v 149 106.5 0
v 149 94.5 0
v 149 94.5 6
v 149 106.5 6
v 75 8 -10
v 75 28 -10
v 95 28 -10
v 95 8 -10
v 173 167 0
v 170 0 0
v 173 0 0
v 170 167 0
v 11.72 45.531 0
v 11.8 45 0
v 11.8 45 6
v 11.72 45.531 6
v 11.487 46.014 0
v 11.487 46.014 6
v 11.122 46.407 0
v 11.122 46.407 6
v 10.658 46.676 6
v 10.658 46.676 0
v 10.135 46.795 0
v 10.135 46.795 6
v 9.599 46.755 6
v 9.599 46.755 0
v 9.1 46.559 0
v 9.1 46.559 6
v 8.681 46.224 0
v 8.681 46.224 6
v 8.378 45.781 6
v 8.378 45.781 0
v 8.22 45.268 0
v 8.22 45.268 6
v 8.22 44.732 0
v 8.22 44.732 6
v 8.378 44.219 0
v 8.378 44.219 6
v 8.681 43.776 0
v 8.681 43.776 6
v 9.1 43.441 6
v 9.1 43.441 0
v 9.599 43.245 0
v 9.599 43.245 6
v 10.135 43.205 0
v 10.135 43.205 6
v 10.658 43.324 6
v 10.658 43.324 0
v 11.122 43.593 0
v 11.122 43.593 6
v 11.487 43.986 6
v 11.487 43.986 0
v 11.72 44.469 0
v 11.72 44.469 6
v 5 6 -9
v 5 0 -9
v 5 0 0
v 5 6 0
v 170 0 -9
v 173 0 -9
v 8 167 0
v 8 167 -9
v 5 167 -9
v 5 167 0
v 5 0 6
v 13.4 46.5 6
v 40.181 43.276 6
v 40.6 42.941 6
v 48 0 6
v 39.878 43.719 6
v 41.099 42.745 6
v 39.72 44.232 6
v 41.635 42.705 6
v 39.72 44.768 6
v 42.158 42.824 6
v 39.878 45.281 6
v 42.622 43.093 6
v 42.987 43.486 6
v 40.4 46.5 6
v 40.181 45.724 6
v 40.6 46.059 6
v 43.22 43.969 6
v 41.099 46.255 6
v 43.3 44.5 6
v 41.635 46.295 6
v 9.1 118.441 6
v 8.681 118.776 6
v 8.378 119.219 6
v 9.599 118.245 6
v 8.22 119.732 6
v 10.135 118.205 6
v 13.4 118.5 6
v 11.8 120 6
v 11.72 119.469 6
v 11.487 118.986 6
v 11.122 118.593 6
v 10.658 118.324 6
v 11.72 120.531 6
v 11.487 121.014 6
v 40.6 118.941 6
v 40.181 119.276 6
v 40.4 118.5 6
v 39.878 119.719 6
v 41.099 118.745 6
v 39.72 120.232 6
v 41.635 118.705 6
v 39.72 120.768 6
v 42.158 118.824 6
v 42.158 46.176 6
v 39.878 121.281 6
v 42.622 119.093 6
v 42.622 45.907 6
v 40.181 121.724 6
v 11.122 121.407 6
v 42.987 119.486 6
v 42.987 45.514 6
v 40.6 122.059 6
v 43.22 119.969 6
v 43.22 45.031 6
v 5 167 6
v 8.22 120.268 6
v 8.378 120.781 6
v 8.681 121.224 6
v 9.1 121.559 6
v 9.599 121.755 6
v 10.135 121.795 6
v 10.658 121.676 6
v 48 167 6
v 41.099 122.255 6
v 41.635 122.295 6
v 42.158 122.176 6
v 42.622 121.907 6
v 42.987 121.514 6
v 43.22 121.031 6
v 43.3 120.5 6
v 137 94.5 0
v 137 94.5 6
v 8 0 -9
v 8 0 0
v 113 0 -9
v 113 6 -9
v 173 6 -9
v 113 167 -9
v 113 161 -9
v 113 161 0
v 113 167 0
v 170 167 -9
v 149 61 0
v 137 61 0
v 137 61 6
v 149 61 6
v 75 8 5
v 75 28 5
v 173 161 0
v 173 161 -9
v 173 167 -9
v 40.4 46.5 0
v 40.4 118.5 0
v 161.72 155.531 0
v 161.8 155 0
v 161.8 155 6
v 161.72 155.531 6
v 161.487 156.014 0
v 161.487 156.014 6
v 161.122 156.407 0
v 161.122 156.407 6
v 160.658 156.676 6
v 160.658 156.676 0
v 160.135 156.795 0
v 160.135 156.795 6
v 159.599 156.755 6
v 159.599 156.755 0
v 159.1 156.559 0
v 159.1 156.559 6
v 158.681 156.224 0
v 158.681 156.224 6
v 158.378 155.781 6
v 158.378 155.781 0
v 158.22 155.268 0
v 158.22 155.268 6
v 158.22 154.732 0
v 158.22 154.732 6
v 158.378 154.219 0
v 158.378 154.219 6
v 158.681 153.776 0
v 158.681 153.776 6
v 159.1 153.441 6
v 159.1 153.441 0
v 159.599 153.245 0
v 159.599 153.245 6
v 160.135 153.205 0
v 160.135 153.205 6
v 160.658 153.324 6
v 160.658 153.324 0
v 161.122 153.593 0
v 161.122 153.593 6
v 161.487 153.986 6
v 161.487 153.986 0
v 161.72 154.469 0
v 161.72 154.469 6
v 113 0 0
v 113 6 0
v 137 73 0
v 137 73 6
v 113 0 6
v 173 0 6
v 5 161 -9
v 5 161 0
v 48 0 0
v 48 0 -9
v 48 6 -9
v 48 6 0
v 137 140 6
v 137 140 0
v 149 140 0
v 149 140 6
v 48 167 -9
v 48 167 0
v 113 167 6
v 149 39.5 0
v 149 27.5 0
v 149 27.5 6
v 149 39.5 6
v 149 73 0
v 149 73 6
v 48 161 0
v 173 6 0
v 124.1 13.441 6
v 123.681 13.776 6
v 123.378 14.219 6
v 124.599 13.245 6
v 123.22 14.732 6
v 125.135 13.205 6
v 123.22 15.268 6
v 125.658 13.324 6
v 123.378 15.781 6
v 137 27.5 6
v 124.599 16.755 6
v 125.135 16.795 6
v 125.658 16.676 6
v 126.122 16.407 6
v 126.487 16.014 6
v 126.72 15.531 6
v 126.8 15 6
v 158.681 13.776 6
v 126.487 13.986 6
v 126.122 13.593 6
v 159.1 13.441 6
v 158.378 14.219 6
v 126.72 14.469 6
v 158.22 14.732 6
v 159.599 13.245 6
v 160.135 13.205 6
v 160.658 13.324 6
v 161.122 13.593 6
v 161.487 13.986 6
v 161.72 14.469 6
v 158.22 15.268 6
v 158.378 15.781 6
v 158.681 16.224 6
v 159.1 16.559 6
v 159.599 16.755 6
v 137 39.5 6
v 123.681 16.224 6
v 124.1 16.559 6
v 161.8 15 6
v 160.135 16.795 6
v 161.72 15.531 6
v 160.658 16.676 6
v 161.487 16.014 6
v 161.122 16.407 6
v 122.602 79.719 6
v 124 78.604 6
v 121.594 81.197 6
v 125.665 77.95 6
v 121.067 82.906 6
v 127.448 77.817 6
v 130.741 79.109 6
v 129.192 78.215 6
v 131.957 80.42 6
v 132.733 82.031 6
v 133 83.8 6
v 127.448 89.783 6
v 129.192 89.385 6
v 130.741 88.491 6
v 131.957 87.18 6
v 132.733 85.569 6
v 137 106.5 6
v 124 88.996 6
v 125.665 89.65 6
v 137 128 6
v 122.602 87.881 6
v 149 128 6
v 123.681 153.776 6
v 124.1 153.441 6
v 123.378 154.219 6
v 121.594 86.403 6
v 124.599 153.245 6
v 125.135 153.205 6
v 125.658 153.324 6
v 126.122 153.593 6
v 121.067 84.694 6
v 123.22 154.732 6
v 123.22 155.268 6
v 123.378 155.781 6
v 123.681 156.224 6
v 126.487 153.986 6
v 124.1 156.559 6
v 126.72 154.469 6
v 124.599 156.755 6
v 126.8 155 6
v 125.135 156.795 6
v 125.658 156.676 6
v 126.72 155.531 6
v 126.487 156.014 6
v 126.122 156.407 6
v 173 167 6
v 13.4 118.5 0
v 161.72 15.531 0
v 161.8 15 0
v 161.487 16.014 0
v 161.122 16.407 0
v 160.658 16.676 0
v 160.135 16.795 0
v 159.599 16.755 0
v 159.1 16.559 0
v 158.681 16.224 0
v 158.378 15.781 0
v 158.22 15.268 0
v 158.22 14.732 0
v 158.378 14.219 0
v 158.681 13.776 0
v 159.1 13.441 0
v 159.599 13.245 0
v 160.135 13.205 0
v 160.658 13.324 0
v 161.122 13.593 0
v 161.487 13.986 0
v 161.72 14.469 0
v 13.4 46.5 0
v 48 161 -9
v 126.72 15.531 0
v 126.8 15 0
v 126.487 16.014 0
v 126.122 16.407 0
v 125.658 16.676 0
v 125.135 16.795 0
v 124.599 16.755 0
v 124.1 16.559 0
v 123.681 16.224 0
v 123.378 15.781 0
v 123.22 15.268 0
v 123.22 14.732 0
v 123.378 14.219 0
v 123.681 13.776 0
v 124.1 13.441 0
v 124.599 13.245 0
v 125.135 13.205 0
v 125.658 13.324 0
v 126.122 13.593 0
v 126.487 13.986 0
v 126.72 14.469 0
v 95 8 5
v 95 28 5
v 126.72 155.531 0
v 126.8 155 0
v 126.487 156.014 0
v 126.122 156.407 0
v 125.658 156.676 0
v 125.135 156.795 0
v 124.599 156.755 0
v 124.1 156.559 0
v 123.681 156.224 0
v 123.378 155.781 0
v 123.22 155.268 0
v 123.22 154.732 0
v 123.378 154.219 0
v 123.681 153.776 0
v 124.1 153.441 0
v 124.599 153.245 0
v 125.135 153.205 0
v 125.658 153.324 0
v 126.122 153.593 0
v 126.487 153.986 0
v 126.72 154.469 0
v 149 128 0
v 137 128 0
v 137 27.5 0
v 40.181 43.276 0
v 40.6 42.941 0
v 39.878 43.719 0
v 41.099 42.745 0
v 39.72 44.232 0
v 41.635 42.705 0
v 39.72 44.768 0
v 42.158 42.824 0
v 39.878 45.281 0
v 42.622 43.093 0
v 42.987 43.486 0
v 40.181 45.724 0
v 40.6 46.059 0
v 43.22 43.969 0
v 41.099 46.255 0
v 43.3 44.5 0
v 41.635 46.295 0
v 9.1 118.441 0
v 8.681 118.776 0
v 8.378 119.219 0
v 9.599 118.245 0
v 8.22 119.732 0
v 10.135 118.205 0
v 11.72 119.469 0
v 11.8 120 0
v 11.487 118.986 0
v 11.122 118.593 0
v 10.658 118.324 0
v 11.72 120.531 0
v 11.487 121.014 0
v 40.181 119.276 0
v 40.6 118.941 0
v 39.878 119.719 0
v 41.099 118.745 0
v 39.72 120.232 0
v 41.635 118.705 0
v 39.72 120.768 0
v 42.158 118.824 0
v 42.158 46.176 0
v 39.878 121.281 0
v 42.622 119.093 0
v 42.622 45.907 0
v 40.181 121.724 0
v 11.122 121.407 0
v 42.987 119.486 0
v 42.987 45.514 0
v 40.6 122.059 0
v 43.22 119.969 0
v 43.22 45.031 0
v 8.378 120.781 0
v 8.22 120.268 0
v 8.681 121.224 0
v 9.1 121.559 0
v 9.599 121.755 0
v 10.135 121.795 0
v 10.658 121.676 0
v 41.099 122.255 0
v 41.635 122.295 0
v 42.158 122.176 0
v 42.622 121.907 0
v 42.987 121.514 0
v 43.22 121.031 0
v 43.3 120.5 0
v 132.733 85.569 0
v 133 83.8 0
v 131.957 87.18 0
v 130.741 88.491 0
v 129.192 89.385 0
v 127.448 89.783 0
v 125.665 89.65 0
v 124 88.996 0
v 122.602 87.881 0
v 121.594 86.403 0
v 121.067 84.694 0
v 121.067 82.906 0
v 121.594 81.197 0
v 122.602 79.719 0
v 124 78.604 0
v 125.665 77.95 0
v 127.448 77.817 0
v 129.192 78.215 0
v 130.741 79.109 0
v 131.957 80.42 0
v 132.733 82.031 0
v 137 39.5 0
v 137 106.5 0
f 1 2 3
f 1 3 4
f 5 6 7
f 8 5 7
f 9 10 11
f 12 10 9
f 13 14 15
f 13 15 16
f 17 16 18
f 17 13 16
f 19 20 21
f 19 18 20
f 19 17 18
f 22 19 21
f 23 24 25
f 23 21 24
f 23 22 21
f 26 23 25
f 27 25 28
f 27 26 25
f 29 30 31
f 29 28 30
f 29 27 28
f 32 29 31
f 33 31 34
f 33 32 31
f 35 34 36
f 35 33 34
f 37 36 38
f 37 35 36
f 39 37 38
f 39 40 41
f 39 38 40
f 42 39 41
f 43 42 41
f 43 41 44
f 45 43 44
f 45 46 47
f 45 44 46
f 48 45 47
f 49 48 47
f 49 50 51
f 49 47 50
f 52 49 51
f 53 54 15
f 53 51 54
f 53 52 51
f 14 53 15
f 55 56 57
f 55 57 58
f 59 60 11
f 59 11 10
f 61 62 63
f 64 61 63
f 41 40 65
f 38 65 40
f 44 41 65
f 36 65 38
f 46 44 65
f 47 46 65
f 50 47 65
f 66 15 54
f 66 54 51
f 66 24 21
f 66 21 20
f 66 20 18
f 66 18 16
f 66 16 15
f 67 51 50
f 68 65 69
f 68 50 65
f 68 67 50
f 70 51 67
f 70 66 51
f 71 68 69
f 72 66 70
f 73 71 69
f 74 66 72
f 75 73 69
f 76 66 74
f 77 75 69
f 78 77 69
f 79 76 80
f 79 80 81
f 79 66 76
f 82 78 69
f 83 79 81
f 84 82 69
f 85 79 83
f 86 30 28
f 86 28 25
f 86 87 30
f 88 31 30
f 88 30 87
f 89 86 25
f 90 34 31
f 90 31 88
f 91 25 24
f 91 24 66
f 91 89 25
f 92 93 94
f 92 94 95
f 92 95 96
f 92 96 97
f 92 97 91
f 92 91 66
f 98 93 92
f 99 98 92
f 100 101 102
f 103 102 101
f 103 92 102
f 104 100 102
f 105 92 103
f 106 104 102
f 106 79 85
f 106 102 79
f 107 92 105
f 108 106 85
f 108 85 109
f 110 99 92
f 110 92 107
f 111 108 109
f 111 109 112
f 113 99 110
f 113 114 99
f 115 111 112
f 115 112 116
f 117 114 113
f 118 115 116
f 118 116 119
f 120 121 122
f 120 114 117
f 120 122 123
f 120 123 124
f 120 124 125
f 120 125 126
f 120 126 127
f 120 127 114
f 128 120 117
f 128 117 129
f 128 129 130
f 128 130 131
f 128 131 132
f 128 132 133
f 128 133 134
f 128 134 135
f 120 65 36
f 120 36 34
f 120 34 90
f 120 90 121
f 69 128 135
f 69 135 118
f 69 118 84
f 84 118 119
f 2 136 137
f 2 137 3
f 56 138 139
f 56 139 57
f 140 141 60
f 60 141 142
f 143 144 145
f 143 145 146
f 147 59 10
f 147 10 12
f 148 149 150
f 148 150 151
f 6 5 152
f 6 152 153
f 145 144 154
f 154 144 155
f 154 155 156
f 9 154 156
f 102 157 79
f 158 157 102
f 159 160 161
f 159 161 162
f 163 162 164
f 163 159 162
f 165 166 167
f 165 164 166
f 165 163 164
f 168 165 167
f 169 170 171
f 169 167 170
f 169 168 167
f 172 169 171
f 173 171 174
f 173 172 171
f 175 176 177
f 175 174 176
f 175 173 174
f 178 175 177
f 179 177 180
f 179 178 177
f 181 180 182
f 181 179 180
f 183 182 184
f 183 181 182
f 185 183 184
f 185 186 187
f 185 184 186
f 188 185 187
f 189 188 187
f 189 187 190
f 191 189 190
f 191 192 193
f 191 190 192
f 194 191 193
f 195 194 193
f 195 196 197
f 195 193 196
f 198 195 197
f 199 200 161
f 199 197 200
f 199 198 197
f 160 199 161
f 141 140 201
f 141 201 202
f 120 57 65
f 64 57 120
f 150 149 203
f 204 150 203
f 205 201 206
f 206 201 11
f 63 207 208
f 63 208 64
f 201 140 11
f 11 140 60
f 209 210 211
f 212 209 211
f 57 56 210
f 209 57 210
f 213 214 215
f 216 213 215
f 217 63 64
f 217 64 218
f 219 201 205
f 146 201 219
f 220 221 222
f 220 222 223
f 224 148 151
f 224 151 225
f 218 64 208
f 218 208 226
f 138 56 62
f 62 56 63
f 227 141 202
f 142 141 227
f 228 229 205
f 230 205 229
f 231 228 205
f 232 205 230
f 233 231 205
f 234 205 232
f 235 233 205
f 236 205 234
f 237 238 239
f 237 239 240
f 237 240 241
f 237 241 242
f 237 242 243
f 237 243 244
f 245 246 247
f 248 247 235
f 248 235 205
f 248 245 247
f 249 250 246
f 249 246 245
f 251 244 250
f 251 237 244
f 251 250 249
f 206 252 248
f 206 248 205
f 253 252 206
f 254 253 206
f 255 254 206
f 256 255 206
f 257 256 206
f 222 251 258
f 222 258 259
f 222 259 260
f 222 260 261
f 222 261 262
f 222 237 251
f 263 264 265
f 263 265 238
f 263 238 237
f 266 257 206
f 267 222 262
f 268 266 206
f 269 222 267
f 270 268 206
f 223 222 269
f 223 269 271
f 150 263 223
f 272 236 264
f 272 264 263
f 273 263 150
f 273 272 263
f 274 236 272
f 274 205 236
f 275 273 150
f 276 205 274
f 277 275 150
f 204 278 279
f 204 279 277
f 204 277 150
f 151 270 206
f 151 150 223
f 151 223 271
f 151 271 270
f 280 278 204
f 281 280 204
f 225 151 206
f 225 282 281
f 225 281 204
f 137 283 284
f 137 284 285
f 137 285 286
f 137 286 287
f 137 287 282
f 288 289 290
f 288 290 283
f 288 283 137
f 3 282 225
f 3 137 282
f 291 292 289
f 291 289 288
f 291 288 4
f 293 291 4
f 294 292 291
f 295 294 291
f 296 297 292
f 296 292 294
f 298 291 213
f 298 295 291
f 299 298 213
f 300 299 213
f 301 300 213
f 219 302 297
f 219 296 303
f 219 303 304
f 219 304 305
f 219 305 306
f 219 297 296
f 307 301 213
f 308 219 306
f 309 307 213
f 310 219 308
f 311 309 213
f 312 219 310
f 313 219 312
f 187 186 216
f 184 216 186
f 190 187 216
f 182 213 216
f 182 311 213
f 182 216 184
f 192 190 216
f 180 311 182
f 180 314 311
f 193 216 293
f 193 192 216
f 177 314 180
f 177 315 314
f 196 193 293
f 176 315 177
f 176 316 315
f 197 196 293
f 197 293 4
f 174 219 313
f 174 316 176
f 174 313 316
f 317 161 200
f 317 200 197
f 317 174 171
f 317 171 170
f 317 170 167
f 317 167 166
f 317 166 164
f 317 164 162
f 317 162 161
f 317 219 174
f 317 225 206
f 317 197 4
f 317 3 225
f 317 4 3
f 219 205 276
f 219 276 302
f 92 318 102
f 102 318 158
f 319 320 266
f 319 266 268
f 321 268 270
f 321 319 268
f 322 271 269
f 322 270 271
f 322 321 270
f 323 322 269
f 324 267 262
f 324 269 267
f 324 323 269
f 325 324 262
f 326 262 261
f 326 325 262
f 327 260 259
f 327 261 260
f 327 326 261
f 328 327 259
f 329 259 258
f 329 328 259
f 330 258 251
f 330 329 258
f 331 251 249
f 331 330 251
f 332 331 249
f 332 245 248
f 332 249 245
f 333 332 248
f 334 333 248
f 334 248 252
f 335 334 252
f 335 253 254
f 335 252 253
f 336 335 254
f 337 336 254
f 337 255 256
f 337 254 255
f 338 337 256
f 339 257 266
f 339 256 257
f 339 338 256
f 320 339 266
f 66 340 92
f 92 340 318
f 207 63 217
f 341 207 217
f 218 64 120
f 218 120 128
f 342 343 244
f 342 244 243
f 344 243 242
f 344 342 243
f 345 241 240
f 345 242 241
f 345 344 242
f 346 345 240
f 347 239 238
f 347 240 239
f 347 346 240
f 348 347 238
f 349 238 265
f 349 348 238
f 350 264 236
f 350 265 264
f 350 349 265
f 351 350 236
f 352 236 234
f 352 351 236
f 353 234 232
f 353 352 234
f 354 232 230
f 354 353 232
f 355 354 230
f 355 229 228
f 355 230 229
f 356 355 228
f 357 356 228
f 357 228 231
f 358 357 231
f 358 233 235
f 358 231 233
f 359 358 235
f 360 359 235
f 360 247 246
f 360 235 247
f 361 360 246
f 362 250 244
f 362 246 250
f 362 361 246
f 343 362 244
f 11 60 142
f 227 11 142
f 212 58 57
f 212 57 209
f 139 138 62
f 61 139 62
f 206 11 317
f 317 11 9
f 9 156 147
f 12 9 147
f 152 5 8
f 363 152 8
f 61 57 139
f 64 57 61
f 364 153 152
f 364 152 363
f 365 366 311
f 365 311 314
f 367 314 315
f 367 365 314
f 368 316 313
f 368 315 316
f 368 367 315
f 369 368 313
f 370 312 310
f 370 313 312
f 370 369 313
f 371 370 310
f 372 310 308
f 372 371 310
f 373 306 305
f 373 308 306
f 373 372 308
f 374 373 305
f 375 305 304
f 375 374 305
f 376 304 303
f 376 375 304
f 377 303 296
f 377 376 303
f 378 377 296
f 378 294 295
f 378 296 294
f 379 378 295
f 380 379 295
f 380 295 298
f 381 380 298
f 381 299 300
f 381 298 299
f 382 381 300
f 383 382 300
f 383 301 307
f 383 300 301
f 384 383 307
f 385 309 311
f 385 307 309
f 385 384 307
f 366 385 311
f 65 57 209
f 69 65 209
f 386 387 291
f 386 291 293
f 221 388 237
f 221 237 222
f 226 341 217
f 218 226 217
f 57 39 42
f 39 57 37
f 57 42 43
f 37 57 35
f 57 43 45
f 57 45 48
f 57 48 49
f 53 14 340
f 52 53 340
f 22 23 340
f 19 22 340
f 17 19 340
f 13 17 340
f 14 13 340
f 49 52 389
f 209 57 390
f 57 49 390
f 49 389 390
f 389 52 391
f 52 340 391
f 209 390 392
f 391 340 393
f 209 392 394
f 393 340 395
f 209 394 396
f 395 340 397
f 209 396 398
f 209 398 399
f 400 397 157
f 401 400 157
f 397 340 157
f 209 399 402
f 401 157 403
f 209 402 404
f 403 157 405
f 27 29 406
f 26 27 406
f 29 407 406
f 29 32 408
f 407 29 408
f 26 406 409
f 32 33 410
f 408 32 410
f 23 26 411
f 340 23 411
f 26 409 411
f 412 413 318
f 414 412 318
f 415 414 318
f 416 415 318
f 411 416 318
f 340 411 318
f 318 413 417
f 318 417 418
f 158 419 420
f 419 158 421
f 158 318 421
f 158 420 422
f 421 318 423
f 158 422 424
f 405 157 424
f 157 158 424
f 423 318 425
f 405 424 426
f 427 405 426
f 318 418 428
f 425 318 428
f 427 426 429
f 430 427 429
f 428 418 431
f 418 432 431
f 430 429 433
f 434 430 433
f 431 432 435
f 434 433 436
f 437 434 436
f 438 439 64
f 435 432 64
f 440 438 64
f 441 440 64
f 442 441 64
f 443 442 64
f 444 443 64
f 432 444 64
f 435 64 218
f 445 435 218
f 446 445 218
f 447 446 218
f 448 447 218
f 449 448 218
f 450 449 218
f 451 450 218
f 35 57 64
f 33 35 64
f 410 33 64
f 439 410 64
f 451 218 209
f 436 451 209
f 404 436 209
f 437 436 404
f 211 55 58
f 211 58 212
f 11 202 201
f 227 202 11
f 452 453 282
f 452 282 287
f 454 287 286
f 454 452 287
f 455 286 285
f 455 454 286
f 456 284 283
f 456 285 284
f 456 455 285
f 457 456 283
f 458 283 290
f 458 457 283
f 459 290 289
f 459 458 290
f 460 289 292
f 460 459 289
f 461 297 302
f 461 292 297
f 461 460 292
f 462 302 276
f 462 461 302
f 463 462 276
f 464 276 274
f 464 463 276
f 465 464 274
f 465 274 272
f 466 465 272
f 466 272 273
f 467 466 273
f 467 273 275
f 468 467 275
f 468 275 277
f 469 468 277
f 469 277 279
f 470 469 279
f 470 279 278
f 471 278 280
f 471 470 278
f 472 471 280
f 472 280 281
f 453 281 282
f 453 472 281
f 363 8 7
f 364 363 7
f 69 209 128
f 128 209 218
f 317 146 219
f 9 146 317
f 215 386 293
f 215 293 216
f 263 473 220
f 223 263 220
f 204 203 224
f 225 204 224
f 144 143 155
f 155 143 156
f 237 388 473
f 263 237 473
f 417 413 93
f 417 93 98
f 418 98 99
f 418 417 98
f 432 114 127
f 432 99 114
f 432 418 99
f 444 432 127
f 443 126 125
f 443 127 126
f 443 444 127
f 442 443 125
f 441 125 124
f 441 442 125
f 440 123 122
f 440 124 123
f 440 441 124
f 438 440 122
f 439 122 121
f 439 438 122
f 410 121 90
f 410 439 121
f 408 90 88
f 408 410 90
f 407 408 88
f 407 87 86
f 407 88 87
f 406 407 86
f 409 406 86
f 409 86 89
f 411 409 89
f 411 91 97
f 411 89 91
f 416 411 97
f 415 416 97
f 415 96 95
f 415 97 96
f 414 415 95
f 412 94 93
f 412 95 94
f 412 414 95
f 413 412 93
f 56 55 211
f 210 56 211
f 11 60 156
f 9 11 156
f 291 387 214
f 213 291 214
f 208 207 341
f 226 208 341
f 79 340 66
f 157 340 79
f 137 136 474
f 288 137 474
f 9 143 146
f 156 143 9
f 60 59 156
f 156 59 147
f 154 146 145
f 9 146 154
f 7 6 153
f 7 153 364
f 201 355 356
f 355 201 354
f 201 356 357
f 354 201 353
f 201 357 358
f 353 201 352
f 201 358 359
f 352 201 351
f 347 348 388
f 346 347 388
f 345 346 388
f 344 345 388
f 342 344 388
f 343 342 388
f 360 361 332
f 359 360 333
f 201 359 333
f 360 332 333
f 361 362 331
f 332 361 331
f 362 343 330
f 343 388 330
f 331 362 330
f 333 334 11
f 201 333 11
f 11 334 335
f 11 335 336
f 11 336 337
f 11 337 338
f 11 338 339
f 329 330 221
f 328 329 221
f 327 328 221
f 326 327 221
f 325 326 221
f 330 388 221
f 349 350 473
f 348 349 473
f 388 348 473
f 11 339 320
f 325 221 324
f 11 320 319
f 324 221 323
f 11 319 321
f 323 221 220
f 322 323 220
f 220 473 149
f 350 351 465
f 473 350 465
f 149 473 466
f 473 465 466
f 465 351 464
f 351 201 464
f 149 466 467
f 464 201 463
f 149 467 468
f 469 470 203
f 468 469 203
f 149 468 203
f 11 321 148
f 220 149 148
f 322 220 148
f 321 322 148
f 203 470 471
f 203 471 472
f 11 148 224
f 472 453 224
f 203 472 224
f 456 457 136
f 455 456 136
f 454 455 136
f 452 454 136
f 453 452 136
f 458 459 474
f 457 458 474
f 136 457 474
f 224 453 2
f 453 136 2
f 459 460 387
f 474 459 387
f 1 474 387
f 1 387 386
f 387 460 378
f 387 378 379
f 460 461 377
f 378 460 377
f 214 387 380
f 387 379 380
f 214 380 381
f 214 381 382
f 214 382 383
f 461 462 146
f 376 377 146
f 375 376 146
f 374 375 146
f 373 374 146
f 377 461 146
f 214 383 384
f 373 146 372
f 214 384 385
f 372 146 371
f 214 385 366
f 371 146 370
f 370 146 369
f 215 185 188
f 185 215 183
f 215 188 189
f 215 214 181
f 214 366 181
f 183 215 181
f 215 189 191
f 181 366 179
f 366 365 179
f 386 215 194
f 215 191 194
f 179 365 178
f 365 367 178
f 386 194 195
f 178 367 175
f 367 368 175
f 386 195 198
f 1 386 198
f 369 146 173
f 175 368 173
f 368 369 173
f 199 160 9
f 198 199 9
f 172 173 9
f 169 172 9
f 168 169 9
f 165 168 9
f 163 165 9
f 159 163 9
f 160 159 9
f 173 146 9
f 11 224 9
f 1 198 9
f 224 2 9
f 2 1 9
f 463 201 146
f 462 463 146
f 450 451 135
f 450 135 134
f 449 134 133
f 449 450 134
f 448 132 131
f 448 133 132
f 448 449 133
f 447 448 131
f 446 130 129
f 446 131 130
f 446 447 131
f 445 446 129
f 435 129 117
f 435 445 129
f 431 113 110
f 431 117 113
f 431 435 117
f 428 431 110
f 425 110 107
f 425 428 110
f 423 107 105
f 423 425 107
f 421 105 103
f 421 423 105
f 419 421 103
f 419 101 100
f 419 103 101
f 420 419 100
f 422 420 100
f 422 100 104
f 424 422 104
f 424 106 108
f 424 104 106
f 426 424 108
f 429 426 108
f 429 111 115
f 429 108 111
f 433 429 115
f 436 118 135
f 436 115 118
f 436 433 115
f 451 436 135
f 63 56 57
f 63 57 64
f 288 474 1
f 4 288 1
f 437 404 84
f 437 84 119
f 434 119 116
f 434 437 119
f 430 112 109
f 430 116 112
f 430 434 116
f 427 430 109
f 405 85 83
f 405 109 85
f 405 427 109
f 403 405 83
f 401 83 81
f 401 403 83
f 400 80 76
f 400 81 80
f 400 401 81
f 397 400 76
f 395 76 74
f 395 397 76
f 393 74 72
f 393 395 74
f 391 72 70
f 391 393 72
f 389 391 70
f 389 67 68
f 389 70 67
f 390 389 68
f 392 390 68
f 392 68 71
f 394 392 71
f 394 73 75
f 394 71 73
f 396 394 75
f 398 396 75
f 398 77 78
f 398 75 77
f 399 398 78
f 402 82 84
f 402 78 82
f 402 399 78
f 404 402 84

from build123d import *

# Parameters (mm, degrees)
BOX001_W          = 43
BOX001_H          = 6
BOX001_DEPTH      = 9
BOX002_W          = 43
BOX002_H          = 6
BOX002_DEPTH      = 9
BOX003_W          = 167
BOX003_H          = 3
BOX003_DEPTH      = 9
BOX009_W          = 60
BOX009_H          = 6
BOX009_DEPTH      = 9
BOX010_W          = 60
BOX010_H          = 6
BOX010_DEPTH      = 9
BOX011_W          = 167
BOX011_H          = 3
BOX011_DEPTH      = 9
TUBE008_R         = 1.8
TUBE008_DEPTH     = 21
TUBE007_R         = 1.8
TUBE007_DEPTH     = 20
TUBE006_R         = 1.8
TUBE006_DEPTH     = 20
TUBE005_R         = 1.8
TUBE005_DEPTH     = 20
BOX004_W          = 27
BOX004_H          = 72
BOX004_DEPTH      = 18
BOX007_W          = 43
BOX007_H          = 167
BOX007_DEPTH      = 6
TUBE010_R         = 1.8
TUBE010_DEPTH     = 20
TUBE011_R         = 1.8
TUBE011_DEPTH     = 20
TUBE012_R         = 1.8
TUBE012_DEPTH     = 20
BOX014_W          = 12
BOX014_H          = 12
BOX014_DEPTH      = 10
BOX012_W          = 12
BOX012_H          = 12
BOX012_DEPTH      = 10
BOX013_W          = 12
BOX013_H          = 12
BOX013_DEPTH      = 10
BOX015_W          = 12
BOX015_H          = 12
BOX015_DEPTH      = 10
CYLINDER005_R     = 6
CYLINDER005_DEPTH = 10
TUBE009_R         = 1.8
TUBE009_DEPTH     = 20
BOX008_W          = 60
BOX008_H          = 167
BOX008_DEPTH      = 6
BOX_W             = 20
BOX_H             = 20
BOX_DEPTH         = 15


with BuildPart() as side1:
    # Box001 → Box001 (new body)
    with BuildSketch(Plane(origin=(5, 0, -9), x_dir=(1, 0, 0), z_dir=(0, 0, 1))):
        with Locations((21.5, 3)):
            Rectangle(BOX001_W, BOX001_H)
    extrude(amount=BOX001_DEPTH)


with BuildPart() as side2:
    # Box002 → Box002 (new body)
    with BuildSketch(Plane(origin=(5, 161, -9), x_dir=(1, 0, 0), z_dir=(0, 0, 1))):
        with Locations((21.5, 3)):
            Rectangle(BOX002_W, BOX002_H)
    extrude(amount=BOX002_DEPTH)


with BuildPart() as side3:
    # Box003 → Box003 (new body)
    with BuildSketch(Plane(origin=(8, 0, -9), x_dir=(0, 1, 0), z_dir=(0, 0, 1))):
        with Locations((83.5, 1.5)):
            Rectangle(BOX003_W, BOX003_H)
    extrude(amount=BOX003_DEPTH)


with BuildPart() as side4:
    # Box009 → Box009 (new body)
    with BuildSketch(Plane(origin=(113, 0, -9), x_dir=(1, 0, 0), z_dir=(0, 0, 1))):
        with Locations((30, 3)):
            Rectangle(BOX009_W, BOX009_H)
    extrude(amount=BOX009_DEPTH)


with BuildPart() as side5:
    # Box010 → Box010 (new body)
    with BuildSketch(Plane(origin=(113, 161, -9), x_dir=(1, 0, 0), z_dir=(0, 0, 1))):
        with Locations((30, 3)):
            Rectangle(BOX010_W, BOX010_H)
    extrude(amount=BOX010_DEPTH)


with BuildPart() as side6:
    # Box011 → Box011 (new body)
    with BuildSketch(Plane(origin=(173, 0, -9), x_dir=(0, 1, 0), z_dir=(0, 0, 1))):
        with Locations((83.5, 1.5)):
            Rectangle(BOX011_W, BOX011_H)
    extrude(amount=BOX011_DEPTH)


with BuildPart() as screw4:
    # Tube008 → Tube008 (new body)
    with BuildSketch(Plane(origin=(41.5, 44.5, -13), x_dir=(1, 0, 0), z_dir=(0, 0, 1))):
        Circle(TUBE008_R)
    extrude(amount=TUBE008_DEPTH)


with BuildPart() as screw3:
    # Tube007 → Tube007 (new body)
    with BuildSketch(Plane(origin=(41.5, 120.5, -10), x_dir=(1, 0, 0), z_dir=(0, 0, 1))):
        Circle(TUBE007_R)
    extrude(amount=TUBE007_DEPTH)


with BuildPart() as screw2:
    # Tube006 → Tube006 (new body)
    with BuildSketch(Plane(origin=(10, 120, -10), x_dir=(1, 0, 0), z_dir=(0, 0, 1))):
        Circle(TUBE006_R)
    extrude(amount=TUBE006_DEPTH)


with BuildPart() as screw1:
    # Tube005 → Tube005 (new body)
    with BuildSketch(Plane(origin=(10, 45, -10), x_dir=(1, 0, 0), z_dir=(0, 0, 1))):
        Circle(TUBE005_R)
    extrude(amount=TUBE005_DEPTH)


with BuildPart() as lcd:
    # Box004 → Box004 (new body)
    with BuildSketch(Plane(origin=(13.4, 46.5, -10), x_dir=(1, 0, 0), z_dir=(0, 0, 1))):
        with Locations((13.5, 36)):
            Rectangle(BOX004_W, BOX004_H)
    extrude(amount=BOX004_DEPTH)


with BuildPart() as cut004:
    # Box007 → Box007 (new body)
    with BuildSketch(Plane(origin=(5, 0, 0), x_dir=(1, 0, 0), z_dir=(0, 0, 1))):
        with Locations((21.5, 83.5)):
            Rectangle(BOX007_W, BOX007_H)
    extrude(amount=BOX007_DEPTH)

    # Cut: cut LCD
    add(lcd.part, mode=Mode.SUBTRACT)

    # Cut001: cut screw1
    add(screw1.part, mode=Mode.SUBTRACT)

    # Cut002: cut screw2
    add(screw2.part, mode=Mode.SUBTRACT)

    # Cut003: cut screw3
    add(screw3.part, mode=Mode.SUBTRACT)

    # Cut004: cut screw4
    add(screw4.part, mode=Mode.SUBTRACT)


with BuildPart() as screw6:
    # Tube010 → Tube010 (new body)
    with BuildSketch(Plane(origin=(160, 15, -10), x_dir=(1, 0, 0), z_dir=(0, 0, 1))):
        Circle(TUBE010_R)
    extrude(amount=TUBE010_DEPTH)


with BuildPart() as screw7:
    # Tube011 → Tube011 (new body)
    with BuildSketch(Plane(origin=(160, 155, -10), x_dir=(1, 0, 0), z_dir=(0, 0, 1))):
        Circle(TUBE011_R)
    extrude(amount=TUBE011_DEPTH)


with BuildPart() as screw8:
    # Tube012 → Tube012 (new body)
    with BuildSketch(Plane(origin=(125, 155, -10), x_dir=(1, 0, 0), z_dir=(0, 0, 1))):
        Circle(TUBE012_R)
    extrude(amount=TUBE012_DEPTH)


with BuildPart() as button3:
    # Box014 → Box014 (new body)
    with BuildSketch(Plane(origin=(137, 94.5, -2), x_dir=(1, 0, 0), z_dir=(0, 0, 1))):
        with Locations((6, 6)):
            Rectangle(BOX014_W, BOX014_H)
    extrude(amount=BOX014_DEPTH)


with BuildPart() as button1:
    # Box012 → Box012 (new body)
    with BuildSketch(Plane(origin=(137, 27.5, -2), x_dir=(1, 0, 0), z_dir=(0, 0, 1))):
        with Locations((6, 6)):
            Rectangle(BOX012_W, BOX012_H)
    extrude(amount=BOX012_DEPTH)


with BuildPart() as button4:
    # Box013 → Box013 (new body)
    with BuildSketch(Plane(origin=(137, 128, -2), x_dir=(1, 0, 0), z_dir=(0, 0, 1))):
        with Locations((6, 6)):
            Rectangle(BOX013_W, BOX013_H)
    extrude(amount=BOX013_DEPTH)


with BuildPart() as button2:
    # Box015 → Box015 (new body)
    with BuildSketch(Plane(origin=(137, 61, -2), x_dir=(1, 0, 0), z_dir=(0, 0, 1))):
        with Locations((6, 6)):
            Rectangle(BOX015_W, BOX015_H)
    extrude(amount=BOX015_DEPTH)


with BuildPart() as buzzer:
    # Cylinder005 → Cylinder005 (new body)
    with BuildSketch(Plane(origin=(127, 83.8, -2), x_dir=(1, 0, 0), z_dir=(0, 0, 1))):
        Circle(CYLINDER005_R)
    extrude(amount=CYLINDER005_DEPTH)


with BuildPart() as screw5:
    # Tube009 → Tube009 (new body)
    with BuildSketch(Plane(origin=(125, 15, -10), x_dir=(1, 0, 0), z_dir=(0, 0, 1))):
        Circle(TUBE009_R)
    extrude(amount=TUBE009_DEPTH)


with BuildPart() as cut013:
    # Box008 → Box008 (new body)
    with BuildSketch(Plane(origin=(113, 0, 0), x_dir=(1, 0, 0), z_dir=(0, 0, 1))):
        with Locations((30, 83.5)):
            Rectangle(BOX008_W, BOX008_H)
    extrude(amount=BOX008_DEPTH)

    # Cut005: cut screw5
    add(screw5.part, mode=Mode.SUBTRACT)

    # Cut006: cut Buzzer
    add(buzzer.part, mode=Mode.SUBTRACT)

    # Cut007: cut Button2
    add(button2.part, mode=Mode.SUBTRACT)

    # Cut008: cut Button4
    add(button4.part, mode=Mode.SUBTRACT)

    # Cut009: cut Button1
    add(button1.part, mode=Mode.SUBTRACT)

    # Cut010: cut Button3
    add(button3.part, mode=Mode.SUBTRACT)

    # Cut011: cut screw8
    add(screw8.part, mode=Mode.SUBTRACT)

    # Cut012: cut screw7
    add(screw7.part, mode=Mode.SUBTRACT)

    # Cut013: cut screw6
    add(screw6.part, mode=Mode.SUBTRACT)


with BuildPart() as ledmatrix_supports:
    # Box → Box (new body)
    with BuildSketch(Plane(origin=(75, 8, -10), x_dir=(1, 0, 0), z_dir=(0, 0, 1))):
        with Locations((10, 10)):
            Rectangle(BOX_W, BOX_H)
    extrude(amount=BOX_DEPTH)


solid = Compound([side1.part, side2.part, side3.part, side4.part, side5.part, side6.part, cut004.part, cut013.part, ledmatrix_supports.part])
